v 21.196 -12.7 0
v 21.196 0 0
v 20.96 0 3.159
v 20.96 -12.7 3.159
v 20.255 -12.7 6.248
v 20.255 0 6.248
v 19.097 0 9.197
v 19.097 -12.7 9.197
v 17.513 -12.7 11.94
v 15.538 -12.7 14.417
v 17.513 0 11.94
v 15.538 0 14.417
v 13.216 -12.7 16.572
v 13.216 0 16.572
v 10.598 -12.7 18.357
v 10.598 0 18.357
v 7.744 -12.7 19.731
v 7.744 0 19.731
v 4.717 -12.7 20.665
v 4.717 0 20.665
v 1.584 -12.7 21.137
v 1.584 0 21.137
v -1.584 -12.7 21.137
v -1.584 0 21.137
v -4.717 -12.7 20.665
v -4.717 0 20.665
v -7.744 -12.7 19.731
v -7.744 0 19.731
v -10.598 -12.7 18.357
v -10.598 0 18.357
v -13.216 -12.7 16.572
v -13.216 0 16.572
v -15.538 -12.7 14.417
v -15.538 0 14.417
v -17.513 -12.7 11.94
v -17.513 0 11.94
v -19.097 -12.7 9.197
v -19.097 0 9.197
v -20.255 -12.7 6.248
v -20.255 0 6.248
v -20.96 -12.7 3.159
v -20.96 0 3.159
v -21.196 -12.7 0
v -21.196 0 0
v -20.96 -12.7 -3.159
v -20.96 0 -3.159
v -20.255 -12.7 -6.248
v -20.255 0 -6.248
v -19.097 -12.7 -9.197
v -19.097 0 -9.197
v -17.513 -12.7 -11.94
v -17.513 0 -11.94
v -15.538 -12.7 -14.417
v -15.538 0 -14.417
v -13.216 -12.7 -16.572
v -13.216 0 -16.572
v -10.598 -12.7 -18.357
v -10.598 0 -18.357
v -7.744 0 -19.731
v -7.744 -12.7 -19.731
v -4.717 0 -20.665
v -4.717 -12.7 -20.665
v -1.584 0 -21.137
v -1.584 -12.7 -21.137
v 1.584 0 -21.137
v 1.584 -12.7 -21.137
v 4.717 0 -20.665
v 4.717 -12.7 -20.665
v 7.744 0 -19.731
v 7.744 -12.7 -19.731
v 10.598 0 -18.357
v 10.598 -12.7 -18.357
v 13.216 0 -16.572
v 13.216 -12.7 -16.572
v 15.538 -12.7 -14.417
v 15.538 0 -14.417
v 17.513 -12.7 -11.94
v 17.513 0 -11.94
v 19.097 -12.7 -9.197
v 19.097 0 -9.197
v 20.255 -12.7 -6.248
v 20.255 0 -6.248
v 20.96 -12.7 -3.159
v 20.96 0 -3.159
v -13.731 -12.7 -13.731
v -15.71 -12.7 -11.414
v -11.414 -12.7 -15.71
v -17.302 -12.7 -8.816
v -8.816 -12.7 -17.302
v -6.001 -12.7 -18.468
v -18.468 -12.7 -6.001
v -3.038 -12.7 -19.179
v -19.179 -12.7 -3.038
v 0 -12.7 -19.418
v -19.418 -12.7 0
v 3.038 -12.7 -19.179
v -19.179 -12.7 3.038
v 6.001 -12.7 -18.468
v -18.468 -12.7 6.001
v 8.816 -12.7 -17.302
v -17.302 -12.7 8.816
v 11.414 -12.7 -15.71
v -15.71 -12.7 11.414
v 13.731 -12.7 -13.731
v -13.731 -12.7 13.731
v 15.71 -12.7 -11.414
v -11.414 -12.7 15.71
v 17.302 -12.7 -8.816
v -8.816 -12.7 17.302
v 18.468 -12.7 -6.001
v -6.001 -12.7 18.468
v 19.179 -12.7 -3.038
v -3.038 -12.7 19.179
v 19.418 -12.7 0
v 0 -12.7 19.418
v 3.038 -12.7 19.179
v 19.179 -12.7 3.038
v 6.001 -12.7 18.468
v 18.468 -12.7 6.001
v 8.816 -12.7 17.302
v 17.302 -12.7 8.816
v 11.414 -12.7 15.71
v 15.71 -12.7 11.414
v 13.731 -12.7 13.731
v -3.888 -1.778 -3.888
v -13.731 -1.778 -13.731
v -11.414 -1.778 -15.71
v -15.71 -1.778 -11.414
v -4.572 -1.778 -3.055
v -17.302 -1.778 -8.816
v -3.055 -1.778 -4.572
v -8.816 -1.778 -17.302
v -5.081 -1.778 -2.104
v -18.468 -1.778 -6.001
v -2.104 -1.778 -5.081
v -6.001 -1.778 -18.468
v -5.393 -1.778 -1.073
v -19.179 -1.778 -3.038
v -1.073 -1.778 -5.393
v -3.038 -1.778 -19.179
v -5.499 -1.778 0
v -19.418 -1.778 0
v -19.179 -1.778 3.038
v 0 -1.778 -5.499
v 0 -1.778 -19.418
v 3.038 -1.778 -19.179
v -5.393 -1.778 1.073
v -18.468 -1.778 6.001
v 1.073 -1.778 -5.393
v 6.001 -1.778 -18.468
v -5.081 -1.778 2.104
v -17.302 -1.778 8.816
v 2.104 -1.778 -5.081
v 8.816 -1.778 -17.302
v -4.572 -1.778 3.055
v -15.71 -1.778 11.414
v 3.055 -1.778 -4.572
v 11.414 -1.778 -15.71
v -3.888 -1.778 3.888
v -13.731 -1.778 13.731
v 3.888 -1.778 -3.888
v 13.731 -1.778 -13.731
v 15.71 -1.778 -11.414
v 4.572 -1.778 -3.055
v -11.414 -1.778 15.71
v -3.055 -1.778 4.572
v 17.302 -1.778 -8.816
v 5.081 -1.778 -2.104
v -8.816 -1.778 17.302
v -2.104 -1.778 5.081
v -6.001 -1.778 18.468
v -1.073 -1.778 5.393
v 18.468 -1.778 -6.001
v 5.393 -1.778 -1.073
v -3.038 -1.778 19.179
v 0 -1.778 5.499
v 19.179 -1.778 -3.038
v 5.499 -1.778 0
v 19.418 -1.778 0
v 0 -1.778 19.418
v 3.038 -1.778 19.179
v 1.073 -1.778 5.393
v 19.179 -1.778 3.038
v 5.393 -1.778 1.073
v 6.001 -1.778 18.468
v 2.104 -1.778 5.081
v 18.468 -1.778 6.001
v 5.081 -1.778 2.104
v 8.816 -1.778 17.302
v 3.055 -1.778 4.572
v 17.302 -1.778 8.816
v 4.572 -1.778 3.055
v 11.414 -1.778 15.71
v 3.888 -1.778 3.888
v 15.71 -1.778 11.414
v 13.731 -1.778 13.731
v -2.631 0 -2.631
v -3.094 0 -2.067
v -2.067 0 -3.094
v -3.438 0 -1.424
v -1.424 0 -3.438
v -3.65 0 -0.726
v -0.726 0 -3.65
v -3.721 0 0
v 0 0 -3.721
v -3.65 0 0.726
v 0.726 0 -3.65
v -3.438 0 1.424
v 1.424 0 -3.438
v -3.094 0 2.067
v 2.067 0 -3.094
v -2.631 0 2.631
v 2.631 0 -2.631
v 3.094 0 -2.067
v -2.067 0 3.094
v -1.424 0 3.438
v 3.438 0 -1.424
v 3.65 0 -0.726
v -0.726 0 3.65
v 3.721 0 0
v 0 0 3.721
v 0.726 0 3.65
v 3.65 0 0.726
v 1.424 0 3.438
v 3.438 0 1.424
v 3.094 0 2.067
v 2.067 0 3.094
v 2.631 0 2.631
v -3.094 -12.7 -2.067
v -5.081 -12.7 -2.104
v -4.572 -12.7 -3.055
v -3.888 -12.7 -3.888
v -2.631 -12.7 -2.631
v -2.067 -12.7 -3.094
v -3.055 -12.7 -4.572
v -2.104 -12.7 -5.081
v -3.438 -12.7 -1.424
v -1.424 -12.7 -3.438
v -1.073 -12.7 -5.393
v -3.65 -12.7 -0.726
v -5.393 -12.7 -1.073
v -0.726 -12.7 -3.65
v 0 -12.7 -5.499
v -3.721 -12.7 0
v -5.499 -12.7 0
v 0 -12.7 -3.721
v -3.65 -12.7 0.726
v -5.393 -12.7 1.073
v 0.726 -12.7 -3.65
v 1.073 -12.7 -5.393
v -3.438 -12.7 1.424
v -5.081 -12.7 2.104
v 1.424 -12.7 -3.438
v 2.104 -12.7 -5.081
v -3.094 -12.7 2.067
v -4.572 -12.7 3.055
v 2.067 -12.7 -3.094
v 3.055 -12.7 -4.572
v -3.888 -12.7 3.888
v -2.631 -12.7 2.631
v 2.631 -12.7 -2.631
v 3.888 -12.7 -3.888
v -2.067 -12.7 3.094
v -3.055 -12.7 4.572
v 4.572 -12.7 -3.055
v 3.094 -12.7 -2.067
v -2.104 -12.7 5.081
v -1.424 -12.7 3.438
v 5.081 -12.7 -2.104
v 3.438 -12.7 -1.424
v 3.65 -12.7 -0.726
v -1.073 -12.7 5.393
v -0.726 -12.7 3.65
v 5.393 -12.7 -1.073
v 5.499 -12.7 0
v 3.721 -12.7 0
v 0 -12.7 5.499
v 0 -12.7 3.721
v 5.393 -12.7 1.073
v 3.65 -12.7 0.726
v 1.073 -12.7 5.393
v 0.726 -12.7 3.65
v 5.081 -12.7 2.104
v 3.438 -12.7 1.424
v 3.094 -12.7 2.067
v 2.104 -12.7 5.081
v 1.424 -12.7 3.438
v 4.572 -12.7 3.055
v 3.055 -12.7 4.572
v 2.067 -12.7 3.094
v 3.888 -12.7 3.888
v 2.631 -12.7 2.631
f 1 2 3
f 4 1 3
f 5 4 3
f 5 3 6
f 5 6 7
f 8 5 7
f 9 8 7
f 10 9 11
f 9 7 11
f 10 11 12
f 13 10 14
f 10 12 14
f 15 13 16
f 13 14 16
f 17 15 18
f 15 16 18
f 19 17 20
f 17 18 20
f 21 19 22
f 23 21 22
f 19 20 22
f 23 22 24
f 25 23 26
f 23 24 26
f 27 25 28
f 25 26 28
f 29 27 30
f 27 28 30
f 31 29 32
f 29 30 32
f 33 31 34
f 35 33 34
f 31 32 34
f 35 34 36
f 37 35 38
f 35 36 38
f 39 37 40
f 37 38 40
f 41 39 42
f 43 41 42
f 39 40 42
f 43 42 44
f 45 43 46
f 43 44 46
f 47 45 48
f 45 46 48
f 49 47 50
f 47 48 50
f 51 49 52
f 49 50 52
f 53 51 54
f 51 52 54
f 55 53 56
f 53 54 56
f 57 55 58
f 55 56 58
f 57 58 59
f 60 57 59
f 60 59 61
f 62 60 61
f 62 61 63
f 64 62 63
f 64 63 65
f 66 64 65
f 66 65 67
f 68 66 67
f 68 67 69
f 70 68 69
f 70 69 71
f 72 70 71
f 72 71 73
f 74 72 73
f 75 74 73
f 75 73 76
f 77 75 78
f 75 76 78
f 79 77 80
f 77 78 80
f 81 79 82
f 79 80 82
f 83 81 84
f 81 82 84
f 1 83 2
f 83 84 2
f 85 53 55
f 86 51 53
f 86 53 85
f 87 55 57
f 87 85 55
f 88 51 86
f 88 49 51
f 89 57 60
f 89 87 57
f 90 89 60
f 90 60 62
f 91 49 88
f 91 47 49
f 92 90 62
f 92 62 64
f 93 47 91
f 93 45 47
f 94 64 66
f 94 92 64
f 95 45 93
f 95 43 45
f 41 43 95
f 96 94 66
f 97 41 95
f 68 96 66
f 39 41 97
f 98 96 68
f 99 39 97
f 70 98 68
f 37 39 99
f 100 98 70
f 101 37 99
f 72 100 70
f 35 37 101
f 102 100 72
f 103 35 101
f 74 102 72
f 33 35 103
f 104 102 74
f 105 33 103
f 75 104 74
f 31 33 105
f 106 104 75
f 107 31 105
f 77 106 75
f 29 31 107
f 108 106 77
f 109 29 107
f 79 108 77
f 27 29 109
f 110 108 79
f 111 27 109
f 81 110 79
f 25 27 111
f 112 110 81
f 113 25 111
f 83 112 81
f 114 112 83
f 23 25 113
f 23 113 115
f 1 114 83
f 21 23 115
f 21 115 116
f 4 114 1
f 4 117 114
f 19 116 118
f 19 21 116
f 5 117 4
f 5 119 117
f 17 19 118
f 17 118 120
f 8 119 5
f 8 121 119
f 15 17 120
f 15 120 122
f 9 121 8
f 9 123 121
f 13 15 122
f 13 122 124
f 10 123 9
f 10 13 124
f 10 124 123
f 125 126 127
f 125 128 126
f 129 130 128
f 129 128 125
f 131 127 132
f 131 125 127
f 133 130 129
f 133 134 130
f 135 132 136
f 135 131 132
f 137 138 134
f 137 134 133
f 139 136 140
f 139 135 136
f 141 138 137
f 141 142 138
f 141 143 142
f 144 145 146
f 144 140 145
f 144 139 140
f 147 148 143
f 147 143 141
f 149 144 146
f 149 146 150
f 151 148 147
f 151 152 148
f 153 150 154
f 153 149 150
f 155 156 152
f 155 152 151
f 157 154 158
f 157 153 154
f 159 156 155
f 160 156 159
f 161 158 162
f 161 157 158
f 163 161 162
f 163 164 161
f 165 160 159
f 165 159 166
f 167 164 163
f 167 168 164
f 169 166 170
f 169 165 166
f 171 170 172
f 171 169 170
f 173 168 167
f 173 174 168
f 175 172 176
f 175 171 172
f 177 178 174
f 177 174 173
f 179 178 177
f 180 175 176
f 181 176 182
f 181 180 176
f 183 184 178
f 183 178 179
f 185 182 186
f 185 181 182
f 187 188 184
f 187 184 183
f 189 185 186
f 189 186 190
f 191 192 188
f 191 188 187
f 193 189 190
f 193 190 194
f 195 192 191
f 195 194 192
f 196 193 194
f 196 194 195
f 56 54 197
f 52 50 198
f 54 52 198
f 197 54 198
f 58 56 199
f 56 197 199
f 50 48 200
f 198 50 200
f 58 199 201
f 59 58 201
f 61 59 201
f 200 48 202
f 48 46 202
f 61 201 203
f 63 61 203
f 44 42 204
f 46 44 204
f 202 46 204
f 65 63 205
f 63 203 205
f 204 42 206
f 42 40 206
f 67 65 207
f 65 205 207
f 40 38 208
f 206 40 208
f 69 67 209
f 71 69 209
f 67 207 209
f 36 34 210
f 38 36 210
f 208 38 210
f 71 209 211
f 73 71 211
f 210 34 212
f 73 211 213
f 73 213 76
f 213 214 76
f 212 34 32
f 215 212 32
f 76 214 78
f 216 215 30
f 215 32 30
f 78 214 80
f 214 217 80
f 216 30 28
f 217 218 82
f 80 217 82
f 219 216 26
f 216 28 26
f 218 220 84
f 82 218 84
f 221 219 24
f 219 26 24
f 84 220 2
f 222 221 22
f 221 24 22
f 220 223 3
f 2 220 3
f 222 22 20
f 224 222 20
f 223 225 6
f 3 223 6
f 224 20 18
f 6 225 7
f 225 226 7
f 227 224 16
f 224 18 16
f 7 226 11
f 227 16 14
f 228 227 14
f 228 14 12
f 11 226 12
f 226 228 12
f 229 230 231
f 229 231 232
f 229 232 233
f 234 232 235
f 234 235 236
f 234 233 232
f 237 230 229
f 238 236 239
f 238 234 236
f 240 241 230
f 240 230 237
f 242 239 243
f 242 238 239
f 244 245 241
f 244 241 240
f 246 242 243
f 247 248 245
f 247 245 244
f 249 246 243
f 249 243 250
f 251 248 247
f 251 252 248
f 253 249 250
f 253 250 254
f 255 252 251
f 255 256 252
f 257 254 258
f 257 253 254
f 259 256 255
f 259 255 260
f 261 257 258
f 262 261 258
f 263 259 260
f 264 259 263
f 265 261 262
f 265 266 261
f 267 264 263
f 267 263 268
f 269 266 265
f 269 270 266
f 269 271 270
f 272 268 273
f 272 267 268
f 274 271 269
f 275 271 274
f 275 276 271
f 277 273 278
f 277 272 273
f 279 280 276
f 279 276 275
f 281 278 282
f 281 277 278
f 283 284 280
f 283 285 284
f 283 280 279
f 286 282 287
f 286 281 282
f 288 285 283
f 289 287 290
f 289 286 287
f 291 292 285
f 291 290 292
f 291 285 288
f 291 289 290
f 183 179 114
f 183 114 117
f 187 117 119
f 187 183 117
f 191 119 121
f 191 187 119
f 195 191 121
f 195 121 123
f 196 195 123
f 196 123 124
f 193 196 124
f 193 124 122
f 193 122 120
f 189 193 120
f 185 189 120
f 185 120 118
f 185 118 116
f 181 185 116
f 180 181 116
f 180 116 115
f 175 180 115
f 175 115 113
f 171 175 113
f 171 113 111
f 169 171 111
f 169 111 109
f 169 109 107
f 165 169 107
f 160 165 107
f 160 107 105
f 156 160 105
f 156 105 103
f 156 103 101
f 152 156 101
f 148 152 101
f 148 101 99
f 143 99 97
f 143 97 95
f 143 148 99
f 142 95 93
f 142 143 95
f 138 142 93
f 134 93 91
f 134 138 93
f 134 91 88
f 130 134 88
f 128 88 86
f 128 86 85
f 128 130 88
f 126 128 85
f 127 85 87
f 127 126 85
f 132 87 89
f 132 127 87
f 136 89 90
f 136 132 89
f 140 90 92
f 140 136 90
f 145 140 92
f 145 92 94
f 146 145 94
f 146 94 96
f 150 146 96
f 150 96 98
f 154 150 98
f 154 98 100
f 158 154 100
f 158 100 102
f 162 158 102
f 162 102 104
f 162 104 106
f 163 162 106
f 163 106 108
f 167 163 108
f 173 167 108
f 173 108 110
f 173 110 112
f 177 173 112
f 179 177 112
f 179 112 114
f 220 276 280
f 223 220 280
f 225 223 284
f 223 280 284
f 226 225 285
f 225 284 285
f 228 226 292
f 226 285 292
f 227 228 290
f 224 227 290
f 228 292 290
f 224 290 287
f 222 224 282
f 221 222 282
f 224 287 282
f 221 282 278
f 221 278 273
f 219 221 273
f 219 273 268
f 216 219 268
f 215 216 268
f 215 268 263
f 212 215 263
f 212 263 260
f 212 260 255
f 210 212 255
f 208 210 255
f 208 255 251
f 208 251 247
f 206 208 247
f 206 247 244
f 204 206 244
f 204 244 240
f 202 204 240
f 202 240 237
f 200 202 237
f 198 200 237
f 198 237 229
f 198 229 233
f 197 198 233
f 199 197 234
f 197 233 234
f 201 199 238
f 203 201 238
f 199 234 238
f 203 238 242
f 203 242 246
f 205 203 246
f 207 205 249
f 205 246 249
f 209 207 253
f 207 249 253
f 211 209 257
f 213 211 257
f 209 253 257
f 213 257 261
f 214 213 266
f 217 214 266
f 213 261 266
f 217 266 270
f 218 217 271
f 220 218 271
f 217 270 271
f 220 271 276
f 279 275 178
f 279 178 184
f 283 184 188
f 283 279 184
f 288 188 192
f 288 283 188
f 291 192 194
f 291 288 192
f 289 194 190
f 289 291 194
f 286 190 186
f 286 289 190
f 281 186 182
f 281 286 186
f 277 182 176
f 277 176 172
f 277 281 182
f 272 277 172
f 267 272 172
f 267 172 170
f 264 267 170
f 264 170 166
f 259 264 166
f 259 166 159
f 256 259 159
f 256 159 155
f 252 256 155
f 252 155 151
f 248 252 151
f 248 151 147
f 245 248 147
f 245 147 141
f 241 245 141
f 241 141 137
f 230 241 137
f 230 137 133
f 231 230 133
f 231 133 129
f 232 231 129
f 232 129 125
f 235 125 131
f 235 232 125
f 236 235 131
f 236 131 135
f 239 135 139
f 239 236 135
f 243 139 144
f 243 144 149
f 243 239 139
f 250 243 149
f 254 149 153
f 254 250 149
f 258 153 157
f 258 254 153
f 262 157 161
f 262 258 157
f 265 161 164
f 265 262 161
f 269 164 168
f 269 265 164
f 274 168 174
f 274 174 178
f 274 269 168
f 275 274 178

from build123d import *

# Parameters (mm, degrees)
F0_R     = 21.1963
F1_DEPTH = 12.7
F2_R     = 3.7211
F3_DEPTH = 12.701
F4_T     = -1.778


with BuildPart() as f1:
    # F0 (on Front) → F1 (new body)
    with BuildSketch(Plane.XZ):
        Circle(F0_R)
    extrude(amount=F1_DEPTH)

    # F2 (on face) → F3 (cut, through all)
    with BuildSketch(Plane.XZ.offset(12.7)):
        Circle(F2_R)
    extrude(amount=-F3_DEPTH, mode=Mode.SUBTRACT)

    # F4
    f4_openings = [f1.faces().sort_by_distance(p)[0] for p in [
        (-20.596778, -12.7, 0),
    ]]
    offset(amount=F4_T, openings=f4_openings)


solid = f1.part
